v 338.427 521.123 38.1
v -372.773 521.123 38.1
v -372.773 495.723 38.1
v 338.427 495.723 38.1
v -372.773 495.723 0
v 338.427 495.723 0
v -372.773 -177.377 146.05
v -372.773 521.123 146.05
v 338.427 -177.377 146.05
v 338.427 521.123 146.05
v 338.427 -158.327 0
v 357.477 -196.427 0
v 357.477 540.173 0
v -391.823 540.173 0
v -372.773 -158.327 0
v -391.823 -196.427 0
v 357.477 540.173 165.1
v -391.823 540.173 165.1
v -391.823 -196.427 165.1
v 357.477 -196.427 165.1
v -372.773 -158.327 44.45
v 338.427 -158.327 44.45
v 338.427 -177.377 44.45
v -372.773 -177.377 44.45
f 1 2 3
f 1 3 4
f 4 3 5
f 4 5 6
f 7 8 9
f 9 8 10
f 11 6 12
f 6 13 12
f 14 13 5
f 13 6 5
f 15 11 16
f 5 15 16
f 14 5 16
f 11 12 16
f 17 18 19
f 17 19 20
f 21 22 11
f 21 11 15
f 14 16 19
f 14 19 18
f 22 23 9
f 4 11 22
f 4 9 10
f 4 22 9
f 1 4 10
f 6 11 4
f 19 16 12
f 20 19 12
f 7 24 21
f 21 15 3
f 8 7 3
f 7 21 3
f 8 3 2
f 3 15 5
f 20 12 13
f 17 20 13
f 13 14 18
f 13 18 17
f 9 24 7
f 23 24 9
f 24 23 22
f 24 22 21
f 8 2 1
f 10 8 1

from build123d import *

# Parameters (mm, degrees)
F0_W     = 749.3
F0_H     = 736.6
F1_DEPTH = 165.1
F2_T     = -19.05
F3_W     = 711.2
F3_H     = 38.1
F4_DEPTH = 25.4
F5_W     = 711.2
F5_H     = 44.45
F6_DEPTH = 19.05


with BuildPart() as f1:
    # F0 (on Top) → F1 (new body)
    with BuildSketch(Plane.XY):
        with Locations((-17.17346, 171.873332)):
            Rectangle(F0_W, F0_H)
    extrude(amount=F1_DEPTH)

    # F2
    f2_openings = [f1.faces().sort_by_distance(p)[0] for p in [
        (-17.17346, 171.873332, 0),
    ]]
    offset(amount=F2_T, openings=f2_openings)

    # F3 (on face) → F4 (join)
    with BuildSketch(Plane.XZ.offset(-521.123332)):
        with Locations((-17.17346, 19.05)):
            Rectangle(F3_W, F3_H)
    extrude(amount=F4_DEPTH)

    # F5 (on face) → F6 (join)
    with BuildSketch(Plane(origin=(0, -177.376668, 0), x_dir=(-1, 0, 0), z_dir=(0, 1, 0))):
        with Locations((17.17346, 22.225)):
            Rectangle(F5_W, F5_H)
    extrude(amount=F6_DEPTH)


solid = f1.part
